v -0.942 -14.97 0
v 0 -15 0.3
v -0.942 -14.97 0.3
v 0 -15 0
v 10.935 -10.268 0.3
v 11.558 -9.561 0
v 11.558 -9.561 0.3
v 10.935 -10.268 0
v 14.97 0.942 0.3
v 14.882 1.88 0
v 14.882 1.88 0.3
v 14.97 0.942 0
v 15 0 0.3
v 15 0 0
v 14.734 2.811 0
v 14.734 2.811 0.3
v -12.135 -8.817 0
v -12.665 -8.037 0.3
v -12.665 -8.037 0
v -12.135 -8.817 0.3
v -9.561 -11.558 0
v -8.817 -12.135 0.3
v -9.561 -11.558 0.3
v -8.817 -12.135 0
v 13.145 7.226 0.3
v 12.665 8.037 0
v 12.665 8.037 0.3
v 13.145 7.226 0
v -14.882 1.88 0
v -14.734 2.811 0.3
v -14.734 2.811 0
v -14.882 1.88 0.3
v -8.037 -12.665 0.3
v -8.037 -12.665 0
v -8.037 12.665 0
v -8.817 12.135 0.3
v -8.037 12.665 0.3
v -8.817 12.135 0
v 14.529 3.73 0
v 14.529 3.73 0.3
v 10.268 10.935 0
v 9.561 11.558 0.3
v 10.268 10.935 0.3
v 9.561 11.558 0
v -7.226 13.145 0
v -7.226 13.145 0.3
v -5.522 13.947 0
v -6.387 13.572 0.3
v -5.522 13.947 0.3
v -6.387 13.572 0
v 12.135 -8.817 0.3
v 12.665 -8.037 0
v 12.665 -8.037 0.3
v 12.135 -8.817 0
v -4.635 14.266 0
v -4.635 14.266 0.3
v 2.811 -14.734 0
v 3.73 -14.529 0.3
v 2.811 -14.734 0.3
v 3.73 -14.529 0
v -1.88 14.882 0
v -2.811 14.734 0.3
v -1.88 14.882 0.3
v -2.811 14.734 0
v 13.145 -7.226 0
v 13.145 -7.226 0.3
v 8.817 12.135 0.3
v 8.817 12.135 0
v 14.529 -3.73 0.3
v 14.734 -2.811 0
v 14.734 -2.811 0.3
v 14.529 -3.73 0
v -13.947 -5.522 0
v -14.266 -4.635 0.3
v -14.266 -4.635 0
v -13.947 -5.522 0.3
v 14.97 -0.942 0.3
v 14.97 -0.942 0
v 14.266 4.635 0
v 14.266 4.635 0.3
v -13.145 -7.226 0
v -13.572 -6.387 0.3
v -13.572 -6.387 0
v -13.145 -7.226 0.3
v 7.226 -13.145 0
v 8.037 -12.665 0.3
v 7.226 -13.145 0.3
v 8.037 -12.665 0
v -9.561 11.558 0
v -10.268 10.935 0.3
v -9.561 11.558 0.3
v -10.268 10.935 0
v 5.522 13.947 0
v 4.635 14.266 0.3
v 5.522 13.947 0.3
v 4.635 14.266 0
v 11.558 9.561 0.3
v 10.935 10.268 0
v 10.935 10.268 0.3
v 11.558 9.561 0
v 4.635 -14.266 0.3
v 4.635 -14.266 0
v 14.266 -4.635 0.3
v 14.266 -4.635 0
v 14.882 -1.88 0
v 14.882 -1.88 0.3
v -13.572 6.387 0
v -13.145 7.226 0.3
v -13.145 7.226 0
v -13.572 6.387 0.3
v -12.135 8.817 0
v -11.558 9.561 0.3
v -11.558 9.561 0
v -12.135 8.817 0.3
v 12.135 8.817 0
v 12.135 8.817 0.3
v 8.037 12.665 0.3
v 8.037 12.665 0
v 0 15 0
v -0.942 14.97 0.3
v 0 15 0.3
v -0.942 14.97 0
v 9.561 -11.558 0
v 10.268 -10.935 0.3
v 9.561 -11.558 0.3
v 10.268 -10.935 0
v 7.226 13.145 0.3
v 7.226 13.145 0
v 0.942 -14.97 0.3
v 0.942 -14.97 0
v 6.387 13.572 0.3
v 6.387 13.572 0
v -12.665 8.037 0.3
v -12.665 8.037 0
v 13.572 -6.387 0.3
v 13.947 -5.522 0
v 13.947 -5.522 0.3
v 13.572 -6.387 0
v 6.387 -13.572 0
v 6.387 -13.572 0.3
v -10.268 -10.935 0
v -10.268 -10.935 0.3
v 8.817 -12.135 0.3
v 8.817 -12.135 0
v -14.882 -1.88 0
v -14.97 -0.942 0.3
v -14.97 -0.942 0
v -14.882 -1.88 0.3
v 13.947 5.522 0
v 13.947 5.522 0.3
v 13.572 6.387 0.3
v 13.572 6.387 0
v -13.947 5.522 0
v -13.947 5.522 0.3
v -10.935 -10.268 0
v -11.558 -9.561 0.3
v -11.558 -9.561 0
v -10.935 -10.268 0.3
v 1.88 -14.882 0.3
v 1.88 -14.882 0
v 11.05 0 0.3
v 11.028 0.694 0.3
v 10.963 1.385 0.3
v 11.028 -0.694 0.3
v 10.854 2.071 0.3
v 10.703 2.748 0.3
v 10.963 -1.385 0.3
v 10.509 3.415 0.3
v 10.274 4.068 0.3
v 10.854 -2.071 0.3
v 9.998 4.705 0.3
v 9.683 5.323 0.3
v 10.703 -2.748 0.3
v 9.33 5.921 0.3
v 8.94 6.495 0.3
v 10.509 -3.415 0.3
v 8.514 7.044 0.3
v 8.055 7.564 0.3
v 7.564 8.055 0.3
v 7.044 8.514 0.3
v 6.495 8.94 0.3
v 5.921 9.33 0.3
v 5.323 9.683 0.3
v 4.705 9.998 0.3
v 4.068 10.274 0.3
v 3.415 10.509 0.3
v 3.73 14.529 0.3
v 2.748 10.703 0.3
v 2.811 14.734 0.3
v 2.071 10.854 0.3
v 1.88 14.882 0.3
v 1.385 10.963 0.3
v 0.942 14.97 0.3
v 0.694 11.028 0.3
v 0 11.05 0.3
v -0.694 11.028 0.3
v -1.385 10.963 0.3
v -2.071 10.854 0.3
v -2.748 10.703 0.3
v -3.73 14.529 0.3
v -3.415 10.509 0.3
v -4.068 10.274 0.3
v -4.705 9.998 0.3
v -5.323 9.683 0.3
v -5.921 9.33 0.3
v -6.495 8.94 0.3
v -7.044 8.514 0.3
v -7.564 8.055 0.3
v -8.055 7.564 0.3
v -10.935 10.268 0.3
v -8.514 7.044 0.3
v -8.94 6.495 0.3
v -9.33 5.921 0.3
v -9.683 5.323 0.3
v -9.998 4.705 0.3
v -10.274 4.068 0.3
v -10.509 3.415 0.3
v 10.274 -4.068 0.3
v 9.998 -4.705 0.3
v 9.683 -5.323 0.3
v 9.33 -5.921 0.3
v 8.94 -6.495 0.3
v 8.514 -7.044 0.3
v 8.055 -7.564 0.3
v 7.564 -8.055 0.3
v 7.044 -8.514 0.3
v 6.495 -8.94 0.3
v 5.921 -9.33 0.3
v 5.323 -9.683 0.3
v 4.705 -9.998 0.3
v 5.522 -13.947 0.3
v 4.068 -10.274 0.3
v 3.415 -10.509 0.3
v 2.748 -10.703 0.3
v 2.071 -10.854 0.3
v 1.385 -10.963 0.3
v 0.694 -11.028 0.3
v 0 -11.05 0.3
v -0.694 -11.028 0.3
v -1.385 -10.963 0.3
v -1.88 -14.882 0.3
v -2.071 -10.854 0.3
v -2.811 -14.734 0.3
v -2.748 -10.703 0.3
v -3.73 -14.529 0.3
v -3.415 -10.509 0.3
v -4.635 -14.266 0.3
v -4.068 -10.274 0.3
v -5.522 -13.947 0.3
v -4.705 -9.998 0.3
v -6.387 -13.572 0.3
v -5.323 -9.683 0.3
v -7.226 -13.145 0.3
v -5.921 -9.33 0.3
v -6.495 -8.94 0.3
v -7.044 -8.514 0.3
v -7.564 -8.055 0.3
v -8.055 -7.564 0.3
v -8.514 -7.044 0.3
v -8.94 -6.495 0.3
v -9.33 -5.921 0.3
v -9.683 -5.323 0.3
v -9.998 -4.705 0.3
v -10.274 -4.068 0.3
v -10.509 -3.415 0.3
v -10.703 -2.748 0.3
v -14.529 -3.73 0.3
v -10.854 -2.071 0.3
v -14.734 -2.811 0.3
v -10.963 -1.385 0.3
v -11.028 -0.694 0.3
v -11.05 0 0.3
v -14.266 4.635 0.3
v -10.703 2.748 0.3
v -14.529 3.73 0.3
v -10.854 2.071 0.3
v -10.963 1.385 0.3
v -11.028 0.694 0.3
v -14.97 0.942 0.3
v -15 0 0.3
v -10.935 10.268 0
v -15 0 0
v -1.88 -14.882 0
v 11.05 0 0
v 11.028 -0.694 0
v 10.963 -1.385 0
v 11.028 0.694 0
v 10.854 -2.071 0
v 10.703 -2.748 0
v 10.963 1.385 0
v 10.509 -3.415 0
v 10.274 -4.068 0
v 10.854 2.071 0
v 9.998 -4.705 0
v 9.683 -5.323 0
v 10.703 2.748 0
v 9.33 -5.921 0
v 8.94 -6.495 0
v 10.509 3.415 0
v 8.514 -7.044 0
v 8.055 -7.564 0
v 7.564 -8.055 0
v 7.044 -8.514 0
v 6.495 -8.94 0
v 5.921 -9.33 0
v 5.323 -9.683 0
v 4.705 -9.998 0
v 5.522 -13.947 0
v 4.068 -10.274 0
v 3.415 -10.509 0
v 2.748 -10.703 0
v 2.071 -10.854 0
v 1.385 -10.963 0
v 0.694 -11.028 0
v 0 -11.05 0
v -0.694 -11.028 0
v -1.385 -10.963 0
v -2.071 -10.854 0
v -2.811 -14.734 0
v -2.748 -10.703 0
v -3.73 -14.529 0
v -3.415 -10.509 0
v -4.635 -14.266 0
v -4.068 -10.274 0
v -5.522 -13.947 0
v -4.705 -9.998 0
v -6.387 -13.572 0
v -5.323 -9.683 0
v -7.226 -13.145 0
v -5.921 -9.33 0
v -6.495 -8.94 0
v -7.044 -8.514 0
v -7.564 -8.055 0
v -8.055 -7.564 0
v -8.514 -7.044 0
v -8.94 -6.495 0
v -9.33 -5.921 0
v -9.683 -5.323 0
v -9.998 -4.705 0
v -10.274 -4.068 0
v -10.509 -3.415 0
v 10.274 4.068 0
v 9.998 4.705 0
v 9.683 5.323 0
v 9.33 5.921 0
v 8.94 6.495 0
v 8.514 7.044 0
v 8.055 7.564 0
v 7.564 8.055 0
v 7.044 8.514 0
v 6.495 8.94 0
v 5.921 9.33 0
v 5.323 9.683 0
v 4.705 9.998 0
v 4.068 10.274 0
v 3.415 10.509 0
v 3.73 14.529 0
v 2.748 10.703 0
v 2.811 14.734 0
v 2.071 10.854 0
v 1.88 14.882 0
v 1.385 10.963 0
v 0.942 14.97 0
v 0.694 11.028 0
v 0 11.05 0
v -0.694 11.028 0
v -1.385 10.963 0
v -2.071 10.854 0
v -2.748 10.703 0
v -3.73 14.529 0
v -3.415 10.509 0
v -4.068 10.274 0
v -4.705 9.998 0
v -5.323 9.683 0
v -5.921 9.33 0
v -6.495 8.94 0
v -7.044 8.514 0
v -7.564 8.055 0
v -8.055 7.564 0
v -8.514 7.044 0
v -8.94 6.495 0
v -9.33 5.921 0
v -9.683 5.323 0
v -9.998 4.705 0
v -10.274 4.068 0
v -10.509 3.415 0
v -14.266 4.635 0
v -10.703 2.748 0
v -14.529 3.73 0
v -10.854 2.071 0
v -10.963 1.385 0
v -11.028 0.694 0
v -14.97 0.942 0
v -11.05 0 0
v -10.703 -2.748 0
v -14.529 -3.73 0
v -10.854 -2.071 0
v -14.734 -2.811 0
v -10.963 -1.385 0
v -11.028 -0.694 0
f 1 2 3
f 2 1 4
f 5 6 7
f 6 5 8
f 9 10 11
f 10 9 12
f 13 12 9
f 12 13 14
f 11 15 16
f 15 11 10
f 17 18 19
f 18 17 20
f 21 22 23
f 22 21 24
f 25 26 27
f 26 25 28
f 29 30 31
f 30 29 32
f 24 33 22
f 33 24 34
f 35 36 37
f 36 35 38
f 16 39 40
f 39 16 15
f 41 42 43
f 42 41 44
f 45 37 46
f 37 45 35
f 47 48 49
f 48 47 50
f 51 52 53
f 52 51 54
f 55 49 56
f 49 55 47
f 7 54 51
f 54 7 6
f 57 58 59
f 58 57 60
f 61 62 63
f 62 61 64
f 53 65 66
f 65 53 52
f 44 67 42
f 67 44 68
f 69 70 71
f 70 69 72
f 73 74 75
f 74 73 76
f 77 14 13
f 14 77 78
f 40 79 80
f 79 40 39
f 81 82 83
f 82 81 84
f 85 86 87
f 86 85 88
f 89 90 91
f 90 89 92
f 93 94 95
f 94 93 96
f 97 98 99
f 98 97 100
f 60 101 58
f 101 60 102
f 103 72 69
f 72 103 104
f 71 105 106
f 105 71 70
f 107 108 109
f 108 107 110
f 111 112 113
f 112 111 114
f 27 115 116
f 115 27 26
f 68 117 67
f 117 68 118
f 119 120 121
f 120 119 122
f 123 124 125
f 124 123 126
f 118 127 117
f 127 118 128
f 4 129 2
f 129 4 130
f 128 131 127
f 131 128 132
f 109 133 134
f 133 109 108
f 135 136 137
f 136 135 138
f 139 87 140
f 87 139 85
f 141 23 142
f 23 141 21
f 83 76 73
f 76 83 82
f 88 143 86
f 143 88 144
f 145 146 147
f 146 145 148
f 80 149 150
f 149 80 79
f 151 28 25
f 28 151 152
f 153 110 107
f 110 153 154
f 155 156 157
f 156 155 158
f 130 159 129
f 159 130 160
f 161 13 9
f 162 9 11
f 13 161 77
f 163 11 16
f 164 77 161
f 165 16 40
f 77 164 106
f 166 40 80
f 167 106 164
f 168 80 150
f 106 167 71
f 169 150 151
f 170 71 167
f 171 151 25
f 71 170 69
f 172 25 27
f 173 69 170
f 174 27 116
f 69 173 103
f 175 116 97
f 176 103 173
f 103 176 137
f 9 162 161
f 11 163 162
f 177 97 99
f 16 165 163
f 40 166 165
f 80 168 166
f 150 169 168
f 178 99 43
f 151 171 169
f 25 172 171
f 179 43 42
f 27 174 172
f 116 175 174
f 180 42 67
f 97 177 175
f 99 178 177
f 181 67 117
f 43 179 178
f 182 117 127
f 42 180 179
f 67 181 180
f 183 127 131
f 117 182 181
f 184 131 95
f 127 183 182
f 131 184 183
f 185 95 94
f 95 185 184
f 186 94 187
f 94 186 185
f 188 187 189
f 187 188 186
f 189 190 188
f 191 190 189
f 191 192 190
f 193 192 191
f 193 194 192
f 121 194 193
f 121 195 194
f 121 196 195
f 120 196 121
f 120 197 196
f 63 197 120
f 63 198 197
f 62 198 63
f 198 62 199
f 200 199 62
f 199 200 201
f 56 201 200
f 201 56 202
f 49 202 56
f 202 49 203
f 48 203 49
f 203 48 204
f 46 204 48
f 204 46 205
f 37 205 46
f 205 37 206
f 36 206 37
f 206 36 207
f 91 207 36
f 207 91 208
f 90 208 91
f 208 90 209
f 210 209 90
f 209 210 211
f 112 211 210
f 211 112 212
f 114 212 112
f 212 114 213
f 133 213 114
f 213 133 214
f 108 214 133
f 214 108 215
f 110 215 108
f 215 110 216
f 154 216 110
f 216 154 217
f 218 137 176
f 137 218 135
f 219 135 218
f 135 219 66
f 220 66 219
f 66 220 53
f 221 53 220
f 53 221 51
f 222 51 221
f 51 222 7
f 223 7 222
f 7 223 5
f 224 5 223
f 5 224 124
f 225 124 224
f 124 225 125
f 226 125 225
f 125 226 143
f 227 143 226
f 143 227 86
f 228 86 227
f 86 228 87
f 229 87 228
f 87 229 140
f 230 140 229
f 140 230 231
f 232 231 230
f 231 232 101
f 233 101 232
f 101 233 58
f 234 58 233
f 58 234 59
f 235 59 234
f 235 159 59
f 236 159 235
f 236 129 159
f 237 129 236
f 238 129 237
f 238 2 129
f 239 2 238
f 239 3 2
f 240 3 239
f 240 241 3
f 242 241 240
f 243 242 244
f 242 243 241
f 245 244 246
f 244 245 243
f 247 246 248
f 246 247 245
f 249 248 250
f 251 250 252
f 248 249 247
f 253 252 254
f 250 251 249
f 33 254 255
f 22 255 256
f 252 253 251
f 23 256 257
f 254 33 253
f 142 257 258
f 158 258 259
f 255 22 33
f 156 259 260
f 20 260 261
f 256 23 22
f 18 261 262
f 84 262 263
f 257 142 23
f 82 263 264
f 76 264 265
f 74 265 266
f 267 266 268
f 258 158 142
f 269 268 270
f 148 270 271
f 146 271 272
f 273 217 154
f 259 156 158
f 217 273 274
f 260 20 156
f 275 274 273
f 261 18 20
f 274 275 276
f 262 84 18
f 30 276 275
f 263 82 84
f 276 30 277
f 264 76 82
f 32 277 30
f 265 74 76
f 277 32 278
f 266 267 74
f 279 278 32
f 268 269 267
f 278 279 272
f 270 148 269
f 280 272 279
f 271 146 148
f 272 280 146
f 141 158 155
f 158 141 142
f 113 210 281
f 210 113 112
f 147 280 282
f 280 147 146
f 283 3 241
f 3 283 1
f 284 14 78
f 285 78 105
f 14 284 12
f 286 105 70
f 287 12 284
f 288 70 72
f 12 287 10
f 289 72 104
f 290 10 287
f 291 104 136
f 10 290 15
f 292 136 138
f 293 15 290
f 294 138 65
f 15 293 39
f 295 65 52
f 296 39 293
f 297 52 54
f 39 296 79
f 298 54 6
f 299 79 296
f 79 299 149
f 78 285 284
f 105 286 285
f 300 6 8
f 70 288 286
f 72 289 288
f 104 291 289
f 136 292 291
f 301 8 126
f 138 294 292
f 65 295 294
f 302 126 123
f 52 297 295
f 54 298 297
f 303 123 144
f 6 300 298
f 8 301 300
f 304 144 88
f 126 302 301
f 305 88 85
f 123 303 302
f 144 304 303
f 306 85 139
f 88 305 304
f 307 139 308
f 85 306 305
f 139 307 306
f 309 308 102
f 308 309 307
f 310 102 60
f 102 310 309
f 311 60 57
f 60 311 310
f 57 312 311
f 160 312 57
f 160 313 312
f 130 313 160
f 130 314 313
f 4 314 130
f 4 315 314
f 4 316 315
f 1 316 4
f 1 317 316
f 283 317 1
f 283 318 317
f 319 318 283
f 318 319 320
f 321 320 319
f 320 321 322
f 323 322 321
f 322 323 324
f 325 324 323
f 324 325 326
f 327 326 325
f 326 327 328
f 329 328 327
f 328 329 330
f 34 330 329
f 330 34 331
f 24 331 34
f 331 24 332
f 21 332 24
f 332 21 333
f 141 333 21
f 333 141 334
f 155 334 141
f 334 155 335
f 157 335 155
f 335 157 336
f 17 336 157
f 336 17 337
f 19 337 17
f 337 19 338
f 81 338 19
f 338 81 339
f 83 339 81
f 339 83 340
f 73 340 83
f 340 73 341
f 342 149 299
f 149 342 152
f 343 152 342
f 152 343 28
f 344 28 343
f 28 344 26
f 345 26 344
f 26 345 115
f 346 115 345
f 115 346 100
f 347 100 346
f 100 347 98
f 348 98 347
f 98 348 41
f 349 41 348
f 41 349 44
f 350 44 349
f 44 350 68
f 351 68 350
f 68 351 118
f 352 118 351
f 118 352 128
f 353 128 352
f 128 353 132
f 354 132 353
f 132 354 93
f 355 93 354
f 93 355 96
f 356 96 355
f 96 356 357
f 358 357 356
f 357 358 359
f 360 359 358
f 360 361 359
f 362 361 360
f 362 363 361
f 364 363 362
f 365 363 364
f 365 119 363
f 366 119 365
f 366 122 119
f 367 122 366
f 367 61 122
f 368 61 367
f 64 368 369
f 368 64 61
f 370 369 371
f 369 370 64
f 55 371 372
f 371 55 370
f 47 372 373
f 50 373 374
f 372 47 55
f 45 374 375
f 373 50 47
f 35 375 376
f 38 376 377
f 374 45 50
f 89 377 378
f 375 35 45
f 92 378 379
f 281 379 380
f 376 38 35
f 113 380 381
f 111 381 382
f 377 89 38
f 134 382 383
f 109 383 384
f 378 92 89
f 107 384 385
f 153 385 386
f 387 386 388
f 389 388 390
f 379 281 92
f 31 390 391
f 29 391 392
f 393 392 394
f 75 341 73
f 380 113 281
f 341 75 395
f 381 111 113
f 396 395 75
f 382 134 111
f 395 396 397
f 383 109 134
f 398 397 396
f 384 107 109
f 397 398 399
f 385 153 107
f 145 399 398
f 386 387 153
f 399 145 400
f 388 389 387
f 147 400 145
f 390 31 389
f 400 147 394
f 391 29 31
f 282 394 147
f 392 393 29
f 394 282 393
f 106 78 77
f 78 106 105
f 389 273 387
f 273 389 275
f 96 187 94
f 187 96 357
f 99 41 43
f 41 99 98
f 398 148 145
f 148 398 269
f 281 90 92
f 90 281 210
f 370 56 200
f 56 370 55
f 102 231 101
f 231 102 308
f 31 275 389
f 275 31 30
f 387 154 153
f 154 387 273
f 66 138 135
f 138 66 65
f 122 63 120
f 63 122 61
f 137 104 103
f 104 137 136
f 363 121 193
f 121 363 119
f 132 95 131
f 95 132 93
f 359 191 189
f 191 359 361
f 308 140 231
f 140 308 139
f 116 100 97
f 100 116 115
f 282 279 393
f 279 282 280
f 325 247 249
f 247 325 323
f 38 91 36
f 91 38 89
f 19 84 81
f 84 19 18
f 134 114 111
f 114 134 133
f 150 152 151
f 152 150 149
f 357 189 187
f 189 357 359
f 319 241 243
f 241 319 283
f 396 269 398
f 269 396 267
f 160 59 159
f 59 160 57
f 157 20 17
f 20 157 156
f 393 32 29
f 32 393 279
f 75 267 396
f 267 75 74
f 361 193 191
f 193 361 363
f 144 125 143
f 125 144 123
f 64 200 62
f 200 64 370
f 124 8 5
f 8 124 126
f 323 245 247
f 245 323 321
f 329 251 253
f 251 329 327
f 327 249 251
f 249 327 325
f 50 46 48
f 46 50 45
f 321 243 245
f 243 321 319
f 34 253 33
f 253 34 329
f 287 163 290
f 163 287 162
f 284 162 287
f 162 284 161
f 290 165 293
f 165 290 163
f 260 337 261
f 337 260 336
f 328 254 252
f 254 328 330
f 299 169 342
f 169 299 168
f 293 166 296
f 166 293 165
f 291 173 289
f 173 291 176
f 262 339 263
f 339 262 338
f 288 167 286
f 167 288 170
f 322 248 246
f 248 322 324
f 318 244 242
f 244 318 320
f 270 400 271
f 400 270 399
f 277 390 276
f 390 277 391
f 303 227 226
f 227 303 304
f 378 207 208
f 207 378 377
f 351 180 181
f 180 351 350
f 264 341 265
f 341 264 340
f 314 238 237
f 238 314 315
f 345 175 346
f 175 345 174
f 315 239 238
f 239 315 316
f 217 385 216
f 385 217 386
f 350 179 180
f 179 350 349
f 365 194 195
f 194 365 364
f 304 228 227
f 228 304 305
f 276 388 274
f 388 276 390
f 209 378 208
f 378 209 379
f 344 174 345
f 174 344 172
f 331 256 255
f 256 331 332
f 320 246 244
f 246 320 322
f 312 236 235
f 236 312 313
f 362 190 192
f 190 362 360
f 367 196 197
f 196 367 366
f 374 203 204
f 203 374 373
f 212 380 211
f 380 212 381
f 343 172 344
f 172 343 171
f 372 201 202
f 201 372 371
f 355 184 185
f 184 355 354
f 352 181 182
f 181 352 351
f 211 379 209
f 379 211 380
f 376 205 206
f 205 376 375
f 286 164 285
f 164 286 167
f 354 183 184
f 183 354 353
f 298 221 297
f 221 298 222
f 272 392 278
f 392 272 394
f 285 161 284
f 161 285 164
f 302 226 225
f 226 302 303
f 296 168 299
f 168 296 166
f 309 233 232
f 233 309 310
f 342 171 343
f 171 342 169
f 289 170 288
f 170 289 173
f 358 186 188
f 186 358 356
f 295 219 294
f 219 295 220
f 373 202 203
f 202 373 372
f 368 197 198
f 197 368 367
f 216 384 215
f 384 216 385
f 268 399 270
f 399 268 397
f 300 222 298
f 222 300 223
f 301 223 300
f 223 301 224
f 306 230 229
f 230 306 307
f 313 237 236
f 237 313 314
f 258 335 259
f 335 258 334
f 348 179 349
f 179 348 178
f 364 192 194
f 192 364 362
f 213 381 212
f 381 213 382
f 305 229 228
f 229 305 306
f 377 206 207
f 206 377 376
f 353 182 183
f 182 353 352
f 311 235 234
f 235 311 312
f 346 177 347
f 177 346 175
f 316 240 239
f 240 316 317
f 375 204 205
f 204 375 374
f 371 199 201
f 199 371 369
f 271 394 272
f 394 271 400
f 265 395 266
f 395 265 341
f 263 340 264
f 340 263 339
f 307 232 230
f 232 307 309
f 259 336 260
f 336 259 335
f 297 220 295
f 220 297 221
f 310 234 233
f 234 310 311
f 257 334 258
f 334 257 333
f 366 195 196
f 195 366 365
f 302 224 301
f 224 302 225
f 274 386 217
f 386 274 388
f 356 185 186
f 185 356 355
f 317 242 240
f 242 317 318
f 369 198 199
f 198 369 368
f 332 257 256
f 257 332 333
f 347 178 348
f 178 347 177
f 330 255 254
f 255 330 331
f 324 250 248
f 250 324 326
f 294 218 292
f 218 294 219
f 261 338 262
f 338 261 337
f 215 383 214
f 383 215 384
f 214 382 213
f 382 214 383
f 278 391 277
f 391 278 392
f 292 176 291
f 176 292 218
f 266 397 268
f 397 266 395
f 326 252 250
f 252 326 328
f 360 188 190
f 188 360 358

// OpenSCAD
// Bearing washer spacer
// For standard 608 skateboard bearing
// Dimensions in millimeters

// Constants
bearing_outer_diameter = 30;  // Standard 608 bearing outer diameter
bearing_inner_diameter = 22.1;   // Standard 608 bearing inner hole
washer_height = .3;         // Specified length/height
washer_outer_rim = 3;        // Additional diameter beyond bearing

difference() {
    // Outer cylinder (washer body)
    cylinder(h = washer_height, 
            d = bearing_outer_diameter, 
            $fn = 100);
    
    // Inner hole (for bearing shaft)
    translate([0, 0, -1])  // Ensure clean cut through
    cylinder(h = washer_height + 2,  // Add 2mm to ensure clean boolean operation
            d = bearing_inner_diameter,
            $fn = 100);
} 
